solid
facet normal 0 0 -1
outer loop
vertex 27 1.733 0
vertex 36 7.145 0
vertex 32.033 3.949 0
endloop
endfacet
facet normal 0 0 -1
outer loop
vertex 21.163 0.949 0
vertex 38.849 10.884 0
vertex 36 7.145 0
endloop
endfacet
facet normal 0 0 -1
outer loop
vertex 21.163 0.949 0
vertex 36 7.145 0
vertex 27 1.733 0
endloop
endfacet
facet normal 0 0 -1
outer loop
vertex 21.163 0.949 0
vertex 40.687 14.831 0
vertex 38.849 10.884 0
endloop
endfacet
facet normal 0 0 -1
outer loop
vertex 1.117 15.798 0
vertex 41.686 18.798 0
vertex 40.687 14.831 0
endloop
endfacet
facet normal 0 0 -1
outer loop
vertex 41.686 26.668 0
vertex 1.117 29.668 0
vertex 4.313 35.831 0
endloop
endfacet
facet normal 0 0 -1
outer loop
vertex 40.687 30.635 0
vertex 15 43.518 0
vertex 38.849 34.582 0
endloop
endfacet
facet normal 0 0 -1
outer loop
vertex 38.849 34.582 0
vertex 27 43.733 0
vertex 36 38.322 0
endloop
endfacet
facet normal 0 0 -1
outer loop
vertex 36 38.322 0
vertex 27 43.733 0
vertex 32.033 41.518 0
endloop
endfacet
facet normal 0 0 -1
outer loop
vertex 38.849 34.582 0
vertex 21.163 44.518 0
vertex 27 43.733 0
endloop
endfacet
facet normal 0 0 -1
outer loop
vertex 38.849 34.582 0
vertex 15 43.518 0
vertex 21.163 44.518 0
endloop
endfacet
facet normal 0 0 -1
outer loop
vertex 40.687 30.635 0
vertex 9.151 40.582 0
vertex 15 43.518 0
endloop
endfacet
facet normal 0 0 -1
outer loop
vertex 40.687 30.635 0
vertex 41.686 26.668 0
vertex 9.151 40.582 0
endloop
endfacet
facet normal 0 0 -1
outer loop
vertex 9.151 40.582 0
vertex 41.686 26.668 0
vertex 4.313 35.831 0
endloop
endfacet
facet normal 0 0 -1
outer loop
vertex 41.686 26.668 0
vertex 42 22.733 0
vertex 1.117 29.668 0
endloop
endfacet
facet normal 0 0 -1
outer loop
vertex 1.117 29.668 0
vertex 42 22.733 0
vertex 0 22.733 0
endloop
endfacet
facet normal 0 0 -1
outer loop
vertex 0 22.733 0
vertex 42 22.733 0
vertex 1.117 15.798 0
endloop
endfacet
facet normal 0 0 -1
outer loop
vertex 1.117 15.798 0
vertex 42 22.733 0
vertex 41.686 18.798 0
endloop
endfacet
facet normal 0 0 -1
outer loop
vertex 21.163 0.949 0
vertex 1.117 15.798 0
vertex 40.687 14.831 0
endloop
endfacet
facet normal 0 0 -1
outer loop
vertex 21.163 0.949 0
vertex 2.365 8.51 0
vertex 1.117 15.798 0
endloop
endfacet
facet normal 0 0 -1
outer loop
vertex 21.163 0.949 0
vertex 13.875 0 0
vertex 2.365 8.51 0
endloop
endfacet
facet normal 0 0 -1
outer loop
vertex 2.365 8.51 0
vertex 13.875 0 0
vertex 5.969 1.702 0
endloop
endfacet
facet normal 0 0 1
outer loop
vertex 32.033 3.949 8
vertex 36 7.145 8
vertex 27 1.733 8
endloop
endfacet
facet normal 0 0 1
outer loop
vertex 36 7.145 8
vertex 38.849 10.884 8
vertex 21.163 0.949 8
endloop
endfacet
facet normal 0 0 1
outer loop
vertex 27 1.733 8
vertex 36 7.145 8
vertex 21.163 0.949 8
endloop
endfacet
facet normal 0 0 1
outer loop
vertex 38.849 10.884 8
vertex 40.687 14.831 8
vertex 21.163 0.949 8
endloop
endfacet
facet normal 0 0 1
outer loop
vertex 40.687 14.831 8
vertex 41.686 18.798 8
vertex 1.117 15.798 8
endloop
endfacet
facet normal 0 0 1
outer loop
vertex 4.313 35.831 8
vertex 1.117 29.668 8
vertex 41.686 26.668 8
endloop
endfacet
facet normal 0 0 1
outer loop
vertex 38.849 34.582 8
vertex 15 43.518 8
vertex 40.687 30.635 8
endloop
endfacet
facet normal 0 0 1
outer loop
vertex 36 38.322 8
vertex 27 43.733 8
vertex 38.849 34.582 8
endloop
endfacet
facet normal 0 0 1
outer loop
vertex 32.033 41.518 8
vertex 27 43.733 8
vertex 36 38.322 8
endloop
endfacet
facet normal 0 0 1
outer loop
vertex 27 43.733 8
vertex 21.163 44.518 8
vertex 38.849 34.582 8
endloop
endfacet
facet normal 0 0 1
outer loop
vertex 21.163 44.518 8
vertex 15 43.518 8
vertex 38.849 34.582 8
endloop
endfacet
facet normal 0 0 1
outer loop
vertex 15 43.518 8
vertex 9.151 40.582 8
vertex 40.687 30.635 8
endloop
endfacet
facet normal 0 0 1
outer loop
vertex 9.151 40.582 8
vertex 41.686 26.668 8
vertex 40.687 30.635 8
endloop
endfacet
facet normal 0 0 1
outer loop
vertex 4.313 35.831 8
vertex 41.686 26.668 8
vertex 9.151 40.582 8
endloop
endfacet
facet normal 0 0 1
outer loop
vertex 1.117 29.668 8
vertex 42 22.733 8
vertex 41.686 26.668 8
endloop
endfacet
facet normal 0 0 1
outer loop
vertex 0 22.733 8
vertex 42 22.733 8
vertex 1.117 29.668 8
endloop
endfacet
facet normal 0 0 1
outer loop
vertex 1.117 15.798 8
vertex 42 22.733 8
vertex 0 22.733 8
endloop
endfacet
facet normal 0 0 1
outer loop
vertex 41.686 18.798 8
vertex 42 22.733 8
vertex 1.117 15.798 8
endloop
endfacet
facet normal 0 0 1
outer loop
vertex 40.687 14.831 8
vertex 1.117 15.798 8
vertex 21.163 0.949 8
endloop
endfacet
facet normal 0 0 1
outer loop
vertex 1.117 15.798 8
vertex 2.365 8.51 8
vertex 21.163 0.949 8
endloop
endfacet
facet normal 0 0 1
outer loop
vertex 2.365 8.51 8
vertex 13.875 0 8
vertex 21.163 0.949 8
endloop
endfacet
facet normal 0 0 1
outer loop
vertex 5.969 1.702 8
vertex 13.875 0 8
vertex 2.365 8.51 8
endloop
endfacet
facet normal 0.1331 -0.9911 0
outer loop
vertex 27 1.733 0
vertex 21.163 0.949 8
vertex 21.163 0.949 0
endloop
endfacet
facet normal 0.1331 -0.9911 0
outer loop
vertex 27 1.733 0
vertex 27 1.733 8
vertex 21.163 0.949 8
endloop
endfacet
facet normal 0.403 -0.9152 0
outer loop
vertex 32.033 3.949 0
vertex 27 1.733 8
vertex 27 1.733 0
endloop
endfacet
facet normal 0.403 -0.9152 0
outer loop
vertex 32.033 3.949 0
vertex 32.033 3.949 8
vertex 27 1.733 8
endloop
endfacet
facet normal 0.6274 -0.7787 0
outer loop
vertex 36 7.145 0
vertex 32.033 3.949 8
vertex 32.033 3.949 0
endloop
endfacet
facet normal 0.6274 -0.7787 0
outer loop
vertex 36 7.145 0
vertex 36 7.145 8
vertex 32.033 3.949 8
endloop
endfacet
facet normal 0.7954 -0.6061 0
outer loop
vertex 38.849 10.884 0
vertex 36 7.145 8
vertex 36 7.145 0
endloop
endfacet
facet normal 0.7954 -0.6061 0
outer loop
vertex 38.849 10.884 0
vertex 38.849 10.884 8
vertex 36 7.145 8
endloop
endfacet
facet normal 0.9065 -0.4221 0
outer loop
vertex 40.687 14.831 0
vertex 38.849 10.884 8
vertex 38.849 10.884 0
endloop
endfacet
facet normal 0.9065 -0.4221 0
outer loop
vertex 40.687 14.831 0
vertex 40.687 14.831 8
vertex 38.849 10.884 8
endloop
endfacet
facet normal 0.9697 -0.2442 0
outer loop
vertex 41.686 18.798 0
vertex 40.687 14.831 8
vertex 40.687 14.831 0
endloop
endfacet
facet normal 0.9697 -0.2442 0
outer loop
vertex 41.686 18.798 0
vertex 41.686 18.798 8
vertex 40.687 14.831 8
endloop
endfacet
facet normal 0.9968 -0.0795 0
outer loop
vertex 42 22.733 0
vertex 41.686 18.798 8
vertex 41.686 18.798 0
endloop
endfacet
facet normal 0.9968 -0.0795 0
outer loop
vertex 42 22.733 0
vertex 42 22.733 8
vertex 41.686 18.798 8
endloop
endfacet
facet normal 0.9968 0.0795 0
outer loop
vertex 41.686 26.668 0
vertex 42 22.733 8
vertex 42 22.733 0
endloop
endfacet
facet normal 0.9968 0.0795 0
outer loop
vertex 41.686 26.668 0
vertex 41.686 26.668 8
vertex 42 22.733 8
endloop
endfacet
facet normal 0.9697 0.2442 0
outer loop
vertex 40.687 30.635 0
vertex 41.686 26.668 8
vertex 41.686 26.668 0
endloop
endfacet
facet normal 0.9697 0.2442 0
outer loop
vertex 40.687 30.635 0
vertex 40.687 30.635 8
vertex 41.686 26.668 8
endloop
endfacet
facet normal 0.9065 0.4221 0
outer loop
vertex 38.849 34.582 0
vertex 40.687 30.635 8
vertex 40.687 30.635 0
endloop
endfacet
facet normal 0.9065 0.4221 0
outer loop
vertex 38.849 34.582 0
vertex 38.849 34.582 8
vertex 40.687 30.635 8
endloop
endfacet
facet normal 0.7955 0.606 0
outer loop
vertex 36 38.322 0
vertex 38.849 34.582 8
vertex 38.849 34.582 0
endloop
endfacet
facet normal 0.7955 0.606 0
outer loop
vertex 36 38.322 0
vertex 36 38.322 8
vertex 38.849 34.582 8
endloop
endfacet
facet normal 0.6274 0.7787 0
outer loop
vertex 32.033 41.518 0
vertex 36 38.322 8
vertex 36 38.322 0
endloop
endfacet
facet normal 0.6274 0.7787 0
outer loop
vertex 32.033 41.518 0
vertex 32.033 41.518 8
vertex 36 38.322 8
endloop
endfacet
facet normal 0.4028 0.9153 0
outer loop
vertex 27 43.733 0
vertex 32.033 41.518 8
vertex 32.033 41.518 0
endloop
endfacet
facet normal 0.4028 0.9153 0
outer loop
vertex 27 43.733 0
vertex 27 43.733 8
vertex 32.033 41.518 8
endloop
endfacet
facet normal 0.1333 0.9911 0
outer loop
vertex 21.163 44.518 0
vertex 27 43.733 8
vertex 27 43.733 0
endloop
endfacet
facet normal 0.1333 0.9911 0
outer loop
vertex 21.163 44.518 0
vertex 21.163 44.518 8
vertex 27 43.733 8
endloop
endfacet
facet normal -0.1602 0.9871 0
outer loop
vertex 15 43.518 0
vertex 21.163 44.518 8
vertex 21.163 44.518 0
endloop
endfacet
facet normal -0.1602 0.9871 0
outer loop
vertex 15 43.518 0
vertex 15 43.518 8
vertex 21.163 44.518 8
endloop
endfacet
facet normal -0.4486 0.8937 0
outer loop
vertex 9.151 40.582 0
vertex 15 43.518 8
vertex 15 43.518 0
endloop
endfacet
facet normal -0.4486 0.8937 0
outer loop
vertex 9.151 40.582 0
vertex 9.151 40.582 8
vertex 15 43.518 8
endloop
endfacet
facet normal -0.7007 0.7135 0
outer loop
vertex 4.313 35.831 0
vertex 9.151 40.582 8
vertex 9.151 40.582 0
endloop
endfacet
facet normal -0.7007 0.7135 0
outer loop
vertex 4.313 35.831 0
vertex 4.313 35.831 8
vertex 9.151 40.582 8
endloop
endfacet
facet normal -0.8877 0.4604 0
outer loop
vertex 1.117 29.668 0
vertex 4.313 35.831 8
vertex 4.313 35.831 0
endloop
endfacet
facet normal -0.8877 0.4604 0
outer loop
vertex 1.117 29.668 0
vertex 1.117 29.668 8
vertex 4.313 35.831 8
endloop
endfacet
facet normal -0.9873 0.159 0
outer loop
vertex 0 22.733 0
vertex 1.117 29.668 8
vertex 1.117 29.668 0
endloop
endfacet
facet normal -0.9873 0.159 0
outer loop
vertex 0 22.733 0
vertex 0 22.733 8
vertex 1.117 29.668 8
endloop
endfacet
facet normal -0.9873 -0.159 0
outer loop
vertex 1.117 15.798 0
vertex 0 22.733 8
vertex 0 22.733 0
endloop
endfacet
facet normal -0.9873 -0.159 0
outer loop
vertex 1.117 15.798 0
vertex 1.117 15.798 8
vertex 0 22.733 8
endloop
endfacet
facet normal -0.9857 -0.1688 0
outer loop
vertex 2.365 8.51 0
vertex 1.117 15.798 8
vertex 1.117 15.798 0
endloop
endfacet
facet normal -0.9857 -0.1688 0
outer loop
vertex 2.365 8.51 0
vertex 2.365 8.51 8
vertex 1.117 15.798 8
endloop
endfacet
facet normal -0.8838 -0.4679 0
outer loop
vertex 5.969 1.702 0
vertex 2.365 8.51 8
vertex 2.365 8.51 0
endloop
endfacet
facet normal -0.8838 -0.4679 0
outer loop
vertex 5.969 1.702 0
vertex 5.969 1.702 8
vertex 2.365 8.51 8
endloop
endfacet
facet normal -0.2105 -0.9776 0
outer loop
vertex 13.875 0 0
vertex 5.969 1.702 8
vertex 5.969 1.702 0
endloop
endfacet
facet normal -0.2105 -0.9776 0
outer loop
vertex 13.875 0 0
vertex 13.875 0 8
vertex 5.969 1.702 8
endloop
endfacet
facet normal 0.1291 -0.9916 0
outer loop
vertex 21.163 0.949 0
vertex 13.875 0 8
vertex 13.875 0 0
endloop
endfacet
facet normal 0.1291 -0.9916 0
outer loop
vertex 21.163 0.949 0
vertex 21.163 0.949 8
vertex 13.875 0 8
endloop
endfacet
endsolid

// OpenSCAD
$fn = 32;

// ----------------------------------------------------------------------
// Cam disc: base radius 15.0 mm, lift 12.0 mm, 24 profile points
// ----------------------------------------------------------------------

// --- parameters (mm) ---
profile_height = 8;       // extrusion height
profile_points = 24;      // points of the closed outline

profile = [[42, 22.733], [41.686, 26.668], [40.687, 30.635], [38.849, 34.582], [36, 38.322], [32.033, 41.518], [27, 43.733], [21.163, 44.518], [15, 43.518], [9.151, 40.582], [4.313, 35.831], [1.117, 29.668], [0, 22.733], [1.117, 15.798], [2.365, 8.51], [5.969, 1.702], [13.875, 0], [21.163, 0.949], [27, 1.733], [32.033, 3.949], [36, 7.145], [38.849, 10.884], [40.687, 14.831], [41.686, 18.798]];  // single closed polygon, 24 points, counter clockwise

// --- the one profile operation ---
linear_extrude(height = profile_height) polygon(points = profile);
